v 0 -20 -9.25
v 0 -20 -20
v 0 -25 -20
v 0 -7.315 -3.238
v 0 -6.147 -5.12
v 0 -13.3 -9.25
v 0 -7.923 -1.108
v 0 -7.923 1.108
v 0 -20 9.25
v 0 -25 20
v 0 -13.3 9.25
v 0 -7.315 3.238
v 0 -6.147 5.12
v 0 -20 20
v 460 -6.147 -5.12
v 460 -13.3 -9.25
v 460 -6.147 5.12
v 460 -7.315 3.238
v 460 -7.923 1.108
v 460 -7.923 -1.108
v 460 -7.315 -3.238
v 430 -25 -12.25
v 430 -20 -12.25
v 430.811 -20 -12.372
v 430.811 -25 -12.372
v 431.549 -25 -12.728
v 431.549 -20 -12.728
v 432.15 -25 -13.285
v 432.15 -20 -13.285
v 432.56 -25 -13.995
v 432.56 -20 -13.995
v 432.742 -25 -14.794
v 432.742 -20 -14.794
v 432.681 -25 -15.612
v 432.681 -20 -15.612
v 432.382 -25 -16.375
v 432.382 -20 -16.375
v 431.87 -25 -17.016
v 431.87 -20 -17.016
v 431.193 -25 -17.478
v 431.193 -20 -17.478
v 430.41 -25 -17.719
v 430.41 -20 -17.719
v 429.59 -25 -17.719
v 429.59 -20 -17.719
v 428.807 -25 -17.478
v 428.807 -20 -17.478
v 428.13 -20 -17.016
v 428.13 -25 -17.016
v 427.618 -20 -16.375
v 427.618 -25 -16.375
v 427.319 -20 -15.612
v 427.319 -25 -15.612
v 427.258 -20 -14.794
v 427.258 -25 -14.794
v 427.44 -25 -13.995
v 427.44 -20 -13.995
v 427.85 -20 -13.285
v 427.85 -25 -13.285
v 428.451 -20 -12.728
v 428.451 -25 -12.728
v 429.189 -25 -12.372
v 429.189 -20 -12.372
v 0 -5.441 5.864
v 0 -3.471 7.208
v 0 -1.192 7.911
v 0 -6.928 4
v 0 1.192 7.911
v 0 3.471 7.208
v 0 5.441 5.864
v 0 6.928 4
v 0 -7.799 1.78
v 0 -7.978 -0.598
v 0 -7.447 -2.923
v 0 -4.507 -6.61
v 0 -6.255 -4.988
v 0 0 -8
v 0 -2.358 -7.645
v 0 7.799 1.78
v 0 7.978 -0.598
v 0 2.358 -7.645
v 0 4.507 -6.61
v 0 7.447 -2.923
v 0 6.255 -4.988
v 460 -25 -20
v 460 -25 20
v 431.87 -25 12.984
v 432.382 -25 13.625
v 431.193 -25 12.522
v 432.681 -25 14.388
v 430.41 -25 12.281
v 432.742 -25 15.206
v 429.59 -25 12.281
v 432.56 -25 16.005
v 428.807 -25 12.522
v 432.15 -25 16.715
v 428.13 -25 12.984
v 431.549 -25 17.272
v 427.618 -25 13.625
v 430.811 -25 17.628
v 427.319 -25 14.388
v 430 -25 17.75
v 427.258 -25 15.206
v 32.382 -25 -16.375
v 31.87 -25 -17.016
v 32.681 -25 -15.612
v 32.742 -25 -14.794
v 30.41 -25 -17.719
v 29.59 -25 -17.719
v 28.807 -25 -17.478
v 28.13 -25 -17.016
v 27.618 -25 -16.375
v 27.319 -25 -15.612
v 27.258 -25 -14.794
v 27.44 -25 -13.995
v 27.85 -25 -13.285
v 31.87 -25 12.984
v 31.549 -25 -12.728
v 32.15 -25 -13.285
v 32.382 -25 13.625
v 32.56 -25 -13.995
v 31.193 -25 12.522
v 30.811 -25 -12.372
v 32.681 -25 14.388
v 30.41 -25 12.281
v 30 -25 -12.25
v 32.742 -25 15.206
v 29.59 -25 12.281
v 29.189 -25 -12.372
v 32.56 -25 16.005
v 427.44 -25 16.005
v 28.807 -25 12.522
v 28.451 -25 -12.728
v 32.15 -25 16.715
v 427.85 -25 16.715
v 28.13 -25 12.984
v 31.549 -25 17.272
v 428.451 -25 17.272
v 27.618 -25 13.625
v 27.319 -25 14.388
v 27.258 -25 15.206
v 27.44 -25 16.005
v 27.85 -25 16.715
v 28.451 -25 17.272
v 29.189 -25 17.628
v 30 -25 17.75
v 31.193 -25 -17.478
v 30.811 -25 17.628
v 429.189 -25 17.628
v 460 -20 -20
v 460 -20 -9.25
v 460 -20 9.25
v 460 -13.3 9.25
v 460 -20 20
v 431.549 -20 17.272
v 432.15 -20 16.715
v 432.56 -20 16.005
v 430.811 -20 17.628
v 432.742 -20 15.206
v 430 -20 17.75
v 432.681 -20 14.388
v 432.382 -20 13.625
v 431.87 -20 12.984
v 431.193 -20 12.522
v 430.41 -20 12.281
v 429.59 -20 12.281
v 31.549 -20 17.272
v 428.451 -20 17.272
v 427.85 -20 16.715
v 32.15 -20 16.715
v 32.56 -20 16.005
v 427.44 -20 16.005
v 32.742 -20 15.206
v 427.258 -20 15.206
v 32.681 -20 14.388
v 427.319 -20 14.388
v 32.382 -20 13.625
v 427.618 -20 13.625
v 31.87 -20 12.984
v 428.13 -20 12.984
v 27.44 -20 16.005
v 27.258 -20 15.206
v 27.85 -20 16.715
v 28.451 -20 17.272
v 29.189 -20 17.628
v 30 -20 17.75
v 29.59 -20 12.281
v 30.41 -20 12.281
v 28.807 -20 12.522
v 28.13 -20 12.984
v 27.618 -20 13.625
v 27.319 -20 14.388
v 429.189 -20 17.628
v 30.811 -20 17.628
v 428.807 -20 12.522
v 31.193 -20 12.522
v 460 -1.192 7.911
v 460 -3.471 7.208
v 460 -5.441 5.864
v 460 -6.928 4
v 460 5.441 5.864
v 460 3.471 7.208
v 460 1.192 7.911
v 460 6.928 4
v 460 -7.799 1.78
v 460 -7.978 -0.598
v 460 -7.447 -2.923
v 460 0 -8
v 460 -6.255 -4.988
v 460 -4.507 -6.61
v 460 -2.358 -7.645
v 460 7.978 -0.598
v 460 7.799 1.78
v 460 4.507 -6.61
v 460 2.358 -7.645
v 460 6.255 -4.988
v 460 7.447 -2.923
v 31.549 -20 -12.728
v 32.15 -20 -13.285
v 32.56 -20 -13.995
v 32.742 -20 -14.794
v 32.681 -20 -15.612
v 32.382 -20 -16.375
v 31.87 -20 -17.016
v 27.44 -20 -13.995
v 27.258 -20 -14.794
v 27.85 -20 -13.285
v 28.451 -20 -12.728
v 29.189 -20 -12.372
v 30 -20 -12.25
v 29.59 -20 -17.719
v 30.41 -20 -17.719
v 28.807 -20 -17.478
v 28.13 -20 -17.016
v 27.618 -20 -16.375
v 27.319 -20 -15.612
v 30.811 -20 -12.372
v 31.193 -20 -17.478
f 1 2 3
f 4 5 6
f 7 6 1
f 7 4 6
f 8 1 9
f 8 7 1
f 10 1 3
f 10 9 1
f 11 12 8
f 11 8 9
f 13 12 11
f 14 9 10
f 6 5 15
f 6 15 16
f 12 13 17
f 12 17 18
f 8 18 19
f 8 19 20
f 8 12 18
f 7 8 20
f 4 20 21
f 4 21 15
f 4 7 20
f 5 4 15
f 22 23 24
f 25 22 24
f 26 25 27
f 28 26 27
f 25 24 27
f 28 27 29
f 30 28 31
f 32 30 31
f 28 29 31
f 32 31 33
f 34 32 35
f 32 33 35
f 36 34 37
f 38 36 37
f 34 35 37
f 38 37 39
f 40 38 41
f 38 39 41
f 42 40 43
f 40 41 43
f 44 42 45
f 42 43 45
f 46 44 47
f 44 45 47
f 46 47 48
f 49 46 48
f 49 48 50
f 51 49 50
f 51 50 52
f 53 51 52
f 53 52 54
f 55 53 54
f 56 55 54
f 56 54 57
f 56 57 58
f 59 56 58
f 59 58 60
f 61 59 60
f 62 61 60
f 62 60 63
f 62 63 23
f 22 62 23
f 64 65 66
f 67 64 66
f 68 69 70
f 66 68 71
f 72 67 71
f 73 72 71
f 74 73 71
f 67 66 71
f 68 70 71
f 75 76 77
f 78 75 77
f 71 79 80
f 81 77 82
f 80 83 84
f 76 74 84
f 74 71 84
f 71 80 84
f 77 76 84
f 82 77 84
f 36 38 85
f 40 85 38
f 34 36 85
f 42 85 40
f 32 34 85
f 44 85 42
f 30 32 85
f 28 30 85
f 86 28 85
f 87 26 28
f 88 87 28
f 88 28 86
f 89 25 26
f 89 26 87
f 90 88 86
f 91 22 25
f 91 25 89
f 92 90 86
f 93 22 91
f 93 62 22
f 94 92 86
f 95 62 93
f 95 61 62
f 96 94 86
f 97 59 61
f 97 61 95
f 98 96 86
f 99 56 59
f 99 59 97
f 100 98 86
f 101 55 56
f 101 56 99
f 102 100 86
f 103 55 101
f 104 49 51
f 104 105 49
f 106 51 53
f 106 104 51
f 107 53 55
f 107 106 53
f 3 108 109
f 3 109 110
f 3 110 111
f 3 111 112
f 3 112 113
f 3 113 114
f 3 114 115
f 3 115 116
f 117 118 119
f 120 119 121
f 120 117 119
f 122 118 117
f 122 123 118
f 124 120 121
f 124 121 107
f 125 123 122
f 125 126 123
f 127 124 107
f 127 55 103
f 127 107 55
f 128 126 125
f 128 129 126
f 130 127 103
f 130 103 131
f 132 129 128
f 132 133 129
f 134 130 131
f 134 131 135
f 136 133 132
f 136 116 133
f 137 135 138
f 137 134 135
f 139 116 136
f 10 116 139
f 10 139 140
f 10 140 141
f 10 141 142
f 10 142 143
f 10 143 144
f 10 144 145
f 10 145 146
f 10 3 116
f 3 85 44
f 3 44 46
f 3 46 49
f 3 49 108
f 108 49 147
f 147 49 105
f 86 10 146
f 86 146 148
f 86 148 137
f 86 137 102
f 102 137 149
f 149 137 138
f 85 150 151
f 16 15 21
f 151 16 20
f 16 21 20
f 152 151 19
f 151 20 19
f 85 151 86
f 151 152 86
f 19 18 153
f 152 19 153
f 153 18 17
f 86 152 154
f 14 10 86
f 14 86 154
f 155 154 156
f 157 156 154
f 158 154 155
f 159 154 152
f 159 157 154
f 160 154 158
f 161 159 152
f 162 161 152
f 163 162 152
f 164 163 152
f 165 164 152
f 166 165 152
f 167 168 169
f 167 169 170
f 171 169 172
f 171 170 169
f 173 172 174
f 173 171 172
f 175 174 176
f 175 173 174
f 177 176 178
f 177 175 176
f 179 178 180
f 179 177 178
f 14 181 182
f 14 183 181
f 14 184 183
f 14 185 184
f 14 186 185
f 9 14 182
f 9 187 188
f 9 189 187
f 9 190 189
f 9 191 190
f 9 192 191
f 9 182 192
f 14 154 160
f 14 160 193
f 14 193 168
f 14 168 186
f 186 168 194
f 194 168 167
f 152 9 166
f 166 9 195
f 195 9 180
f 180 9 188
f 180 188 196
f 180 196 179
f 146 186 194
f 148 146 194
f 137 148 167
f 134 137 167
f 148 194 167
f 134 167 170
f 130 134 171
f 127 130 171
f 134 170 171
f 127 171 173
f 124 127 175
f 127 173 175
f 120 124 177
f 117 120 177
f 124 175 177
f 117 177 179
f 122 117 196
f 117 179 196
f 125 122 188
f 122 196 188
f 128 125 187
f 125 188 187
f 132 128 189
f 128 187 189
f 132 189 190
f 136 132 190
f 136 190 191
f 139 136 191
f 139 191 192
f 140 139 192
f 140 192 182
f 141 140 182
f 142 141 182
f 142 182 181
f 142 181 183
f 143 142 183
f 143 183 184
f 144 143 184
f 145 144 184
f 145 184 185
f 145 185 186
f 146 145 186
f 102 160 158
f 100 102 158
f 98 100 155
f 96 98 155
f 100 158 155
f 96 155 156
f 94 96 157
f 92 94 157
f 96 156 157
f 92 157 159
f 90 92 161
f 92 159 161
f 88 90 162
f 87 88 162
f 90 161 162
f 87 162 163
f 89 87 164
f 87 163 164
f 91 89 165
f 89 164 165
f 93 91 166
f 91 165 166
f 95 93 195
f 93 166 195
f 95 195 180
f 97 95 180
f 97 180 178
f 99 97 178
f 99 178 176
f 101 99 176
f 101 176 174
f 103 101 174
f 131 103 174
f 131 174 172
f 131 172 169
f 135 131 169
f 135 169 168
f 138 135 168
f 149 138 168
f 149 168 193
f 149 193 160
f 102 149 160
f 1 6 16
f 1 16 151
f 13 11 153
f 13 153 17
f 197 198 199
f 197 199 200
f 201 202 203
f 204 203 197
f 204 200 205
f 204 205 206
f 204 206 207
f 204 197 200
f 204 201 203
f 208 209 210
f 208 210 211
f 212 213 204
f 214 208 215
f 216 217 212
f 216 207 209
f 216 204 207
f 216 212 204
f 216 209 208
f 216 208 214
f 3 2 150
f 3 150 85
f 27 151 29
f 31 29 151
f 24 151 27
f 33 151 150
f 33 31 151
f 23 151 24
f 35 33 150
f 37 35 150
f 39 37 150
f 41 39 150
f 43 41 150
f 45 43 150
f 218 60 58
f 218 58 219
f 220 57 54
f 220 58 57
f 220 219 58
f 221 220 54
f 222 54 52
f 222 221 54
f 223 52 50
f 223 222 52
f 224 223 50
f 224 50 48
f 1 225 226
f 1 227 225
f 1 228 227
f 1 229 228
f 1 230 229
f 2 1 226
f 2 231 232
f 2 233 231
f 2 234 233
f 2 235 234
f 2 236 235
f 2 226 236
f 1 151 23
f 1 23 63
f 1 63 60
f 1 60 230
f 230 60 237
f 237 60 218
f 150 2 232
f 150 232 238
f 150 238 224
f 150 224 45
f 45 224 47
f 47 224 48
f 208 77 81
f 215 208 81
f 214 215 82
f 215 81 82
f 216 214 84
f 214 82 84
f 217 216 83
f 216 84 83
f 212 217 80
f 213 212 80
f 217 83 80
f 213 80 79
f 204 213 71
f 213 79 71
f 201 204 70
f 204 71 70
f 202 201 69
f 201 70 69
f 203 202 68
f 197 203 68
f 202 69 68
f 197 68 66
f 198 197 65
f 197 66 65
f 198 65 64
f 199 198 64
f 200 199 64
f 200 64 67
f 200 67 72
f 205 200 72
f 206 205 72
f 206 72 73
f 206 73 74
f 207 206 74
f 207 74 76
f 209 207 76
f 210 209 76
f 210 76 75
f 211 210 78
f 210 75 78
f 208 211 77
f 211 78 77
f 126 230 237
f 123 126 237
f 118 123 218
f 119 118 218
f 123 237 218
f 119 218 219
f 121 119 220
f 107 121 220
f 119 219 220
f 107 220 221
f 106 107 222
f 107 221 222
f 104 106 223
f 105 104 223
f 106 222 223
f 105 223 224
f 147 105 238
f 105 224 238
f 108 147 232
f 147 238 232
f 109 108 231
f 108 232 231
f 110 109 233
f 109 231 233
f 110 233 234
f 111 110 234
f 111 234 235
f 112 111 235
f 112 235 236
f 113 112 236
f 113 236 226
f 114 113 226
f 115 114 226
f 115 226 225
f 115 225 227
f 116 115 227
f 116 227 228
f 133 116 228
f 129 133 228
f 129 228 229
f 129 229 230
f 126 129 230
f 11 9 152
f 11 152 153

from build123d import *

# Parameters (mm, degrees)
SKETCH_3_R             = 8
EXTRUDE_341_DEPTH      = 460
EXTRUDE_741_DEPTH      = 460
SKETCH_5_R             = 2.75
CUT_EXTRUDE_1021_DEPTH = 462.285161261


with BuildPart() as part:
    # Эскиз3 → Extrude 341 (new body)
    with BuildSketch(Plane(origin=(0, 0, 0), x_dir=(0, 0, -1), z_dir=(1, 0, 0))):
        Circle(SKETCH_3_R)
    extrude(amount=EXTRUDE_341_DEPTH)


with BuildPart() as body_2:
    # Эскиз4 → Extrude 741 (new body)
    with BuildSketch(Plane(origin=(0, 0, 0), x_dir=(0, 0, -1), z_dir=(1, 0, 0))):
        with BuildLine():
            Line((-9.25, -20), (-9.25, -13.3))
            Line((-9.25, -13.3), (-5.1201439, -6.146879407))
            ThreePointArc((-5.1201439, -6.146879407), (0, -8), (5.1201439, -6.146879407))
            Line((5.1201439, -6.146879407), (9.25, -13.3))
            Line((9.25, -13.3), (9.25, -20))
            Line((9.25, -20), (20, -20))
            Line((20, -20), (20, -25))
            Line((20, -25), (-20, -25))
            Line((-20, -25), (-20, -20))
            Line((-20, -20), (-9.25, -20))
        make_face()
    extrude(amount=EXTRUDE_741_DEPTH)

    # Эскиз5 → Cut-Extrude 1021 (cut, through all)
    with BuildSketch(Plane(origin=(0, -20, 0), x_dir=(1, 0, 0), z_dir=(0, 1, 0))):
        with Locations((430, 15)):
            Circle(SKETCH_5_R)
        with Locations((430, -15)):
            Circle(SKETCH_5_R)
        with Locations((30, -15)):
            Circle(SKETCH_5_R)
        with Locations((30, 15)):
            Circle(SKETCH_5_R)
    extrude(amount=-CUT_EXTRUDE_1021_DEPTH, mode=Mode.SUBTRACT)


solid = Compound([part.part, body_2.part])
